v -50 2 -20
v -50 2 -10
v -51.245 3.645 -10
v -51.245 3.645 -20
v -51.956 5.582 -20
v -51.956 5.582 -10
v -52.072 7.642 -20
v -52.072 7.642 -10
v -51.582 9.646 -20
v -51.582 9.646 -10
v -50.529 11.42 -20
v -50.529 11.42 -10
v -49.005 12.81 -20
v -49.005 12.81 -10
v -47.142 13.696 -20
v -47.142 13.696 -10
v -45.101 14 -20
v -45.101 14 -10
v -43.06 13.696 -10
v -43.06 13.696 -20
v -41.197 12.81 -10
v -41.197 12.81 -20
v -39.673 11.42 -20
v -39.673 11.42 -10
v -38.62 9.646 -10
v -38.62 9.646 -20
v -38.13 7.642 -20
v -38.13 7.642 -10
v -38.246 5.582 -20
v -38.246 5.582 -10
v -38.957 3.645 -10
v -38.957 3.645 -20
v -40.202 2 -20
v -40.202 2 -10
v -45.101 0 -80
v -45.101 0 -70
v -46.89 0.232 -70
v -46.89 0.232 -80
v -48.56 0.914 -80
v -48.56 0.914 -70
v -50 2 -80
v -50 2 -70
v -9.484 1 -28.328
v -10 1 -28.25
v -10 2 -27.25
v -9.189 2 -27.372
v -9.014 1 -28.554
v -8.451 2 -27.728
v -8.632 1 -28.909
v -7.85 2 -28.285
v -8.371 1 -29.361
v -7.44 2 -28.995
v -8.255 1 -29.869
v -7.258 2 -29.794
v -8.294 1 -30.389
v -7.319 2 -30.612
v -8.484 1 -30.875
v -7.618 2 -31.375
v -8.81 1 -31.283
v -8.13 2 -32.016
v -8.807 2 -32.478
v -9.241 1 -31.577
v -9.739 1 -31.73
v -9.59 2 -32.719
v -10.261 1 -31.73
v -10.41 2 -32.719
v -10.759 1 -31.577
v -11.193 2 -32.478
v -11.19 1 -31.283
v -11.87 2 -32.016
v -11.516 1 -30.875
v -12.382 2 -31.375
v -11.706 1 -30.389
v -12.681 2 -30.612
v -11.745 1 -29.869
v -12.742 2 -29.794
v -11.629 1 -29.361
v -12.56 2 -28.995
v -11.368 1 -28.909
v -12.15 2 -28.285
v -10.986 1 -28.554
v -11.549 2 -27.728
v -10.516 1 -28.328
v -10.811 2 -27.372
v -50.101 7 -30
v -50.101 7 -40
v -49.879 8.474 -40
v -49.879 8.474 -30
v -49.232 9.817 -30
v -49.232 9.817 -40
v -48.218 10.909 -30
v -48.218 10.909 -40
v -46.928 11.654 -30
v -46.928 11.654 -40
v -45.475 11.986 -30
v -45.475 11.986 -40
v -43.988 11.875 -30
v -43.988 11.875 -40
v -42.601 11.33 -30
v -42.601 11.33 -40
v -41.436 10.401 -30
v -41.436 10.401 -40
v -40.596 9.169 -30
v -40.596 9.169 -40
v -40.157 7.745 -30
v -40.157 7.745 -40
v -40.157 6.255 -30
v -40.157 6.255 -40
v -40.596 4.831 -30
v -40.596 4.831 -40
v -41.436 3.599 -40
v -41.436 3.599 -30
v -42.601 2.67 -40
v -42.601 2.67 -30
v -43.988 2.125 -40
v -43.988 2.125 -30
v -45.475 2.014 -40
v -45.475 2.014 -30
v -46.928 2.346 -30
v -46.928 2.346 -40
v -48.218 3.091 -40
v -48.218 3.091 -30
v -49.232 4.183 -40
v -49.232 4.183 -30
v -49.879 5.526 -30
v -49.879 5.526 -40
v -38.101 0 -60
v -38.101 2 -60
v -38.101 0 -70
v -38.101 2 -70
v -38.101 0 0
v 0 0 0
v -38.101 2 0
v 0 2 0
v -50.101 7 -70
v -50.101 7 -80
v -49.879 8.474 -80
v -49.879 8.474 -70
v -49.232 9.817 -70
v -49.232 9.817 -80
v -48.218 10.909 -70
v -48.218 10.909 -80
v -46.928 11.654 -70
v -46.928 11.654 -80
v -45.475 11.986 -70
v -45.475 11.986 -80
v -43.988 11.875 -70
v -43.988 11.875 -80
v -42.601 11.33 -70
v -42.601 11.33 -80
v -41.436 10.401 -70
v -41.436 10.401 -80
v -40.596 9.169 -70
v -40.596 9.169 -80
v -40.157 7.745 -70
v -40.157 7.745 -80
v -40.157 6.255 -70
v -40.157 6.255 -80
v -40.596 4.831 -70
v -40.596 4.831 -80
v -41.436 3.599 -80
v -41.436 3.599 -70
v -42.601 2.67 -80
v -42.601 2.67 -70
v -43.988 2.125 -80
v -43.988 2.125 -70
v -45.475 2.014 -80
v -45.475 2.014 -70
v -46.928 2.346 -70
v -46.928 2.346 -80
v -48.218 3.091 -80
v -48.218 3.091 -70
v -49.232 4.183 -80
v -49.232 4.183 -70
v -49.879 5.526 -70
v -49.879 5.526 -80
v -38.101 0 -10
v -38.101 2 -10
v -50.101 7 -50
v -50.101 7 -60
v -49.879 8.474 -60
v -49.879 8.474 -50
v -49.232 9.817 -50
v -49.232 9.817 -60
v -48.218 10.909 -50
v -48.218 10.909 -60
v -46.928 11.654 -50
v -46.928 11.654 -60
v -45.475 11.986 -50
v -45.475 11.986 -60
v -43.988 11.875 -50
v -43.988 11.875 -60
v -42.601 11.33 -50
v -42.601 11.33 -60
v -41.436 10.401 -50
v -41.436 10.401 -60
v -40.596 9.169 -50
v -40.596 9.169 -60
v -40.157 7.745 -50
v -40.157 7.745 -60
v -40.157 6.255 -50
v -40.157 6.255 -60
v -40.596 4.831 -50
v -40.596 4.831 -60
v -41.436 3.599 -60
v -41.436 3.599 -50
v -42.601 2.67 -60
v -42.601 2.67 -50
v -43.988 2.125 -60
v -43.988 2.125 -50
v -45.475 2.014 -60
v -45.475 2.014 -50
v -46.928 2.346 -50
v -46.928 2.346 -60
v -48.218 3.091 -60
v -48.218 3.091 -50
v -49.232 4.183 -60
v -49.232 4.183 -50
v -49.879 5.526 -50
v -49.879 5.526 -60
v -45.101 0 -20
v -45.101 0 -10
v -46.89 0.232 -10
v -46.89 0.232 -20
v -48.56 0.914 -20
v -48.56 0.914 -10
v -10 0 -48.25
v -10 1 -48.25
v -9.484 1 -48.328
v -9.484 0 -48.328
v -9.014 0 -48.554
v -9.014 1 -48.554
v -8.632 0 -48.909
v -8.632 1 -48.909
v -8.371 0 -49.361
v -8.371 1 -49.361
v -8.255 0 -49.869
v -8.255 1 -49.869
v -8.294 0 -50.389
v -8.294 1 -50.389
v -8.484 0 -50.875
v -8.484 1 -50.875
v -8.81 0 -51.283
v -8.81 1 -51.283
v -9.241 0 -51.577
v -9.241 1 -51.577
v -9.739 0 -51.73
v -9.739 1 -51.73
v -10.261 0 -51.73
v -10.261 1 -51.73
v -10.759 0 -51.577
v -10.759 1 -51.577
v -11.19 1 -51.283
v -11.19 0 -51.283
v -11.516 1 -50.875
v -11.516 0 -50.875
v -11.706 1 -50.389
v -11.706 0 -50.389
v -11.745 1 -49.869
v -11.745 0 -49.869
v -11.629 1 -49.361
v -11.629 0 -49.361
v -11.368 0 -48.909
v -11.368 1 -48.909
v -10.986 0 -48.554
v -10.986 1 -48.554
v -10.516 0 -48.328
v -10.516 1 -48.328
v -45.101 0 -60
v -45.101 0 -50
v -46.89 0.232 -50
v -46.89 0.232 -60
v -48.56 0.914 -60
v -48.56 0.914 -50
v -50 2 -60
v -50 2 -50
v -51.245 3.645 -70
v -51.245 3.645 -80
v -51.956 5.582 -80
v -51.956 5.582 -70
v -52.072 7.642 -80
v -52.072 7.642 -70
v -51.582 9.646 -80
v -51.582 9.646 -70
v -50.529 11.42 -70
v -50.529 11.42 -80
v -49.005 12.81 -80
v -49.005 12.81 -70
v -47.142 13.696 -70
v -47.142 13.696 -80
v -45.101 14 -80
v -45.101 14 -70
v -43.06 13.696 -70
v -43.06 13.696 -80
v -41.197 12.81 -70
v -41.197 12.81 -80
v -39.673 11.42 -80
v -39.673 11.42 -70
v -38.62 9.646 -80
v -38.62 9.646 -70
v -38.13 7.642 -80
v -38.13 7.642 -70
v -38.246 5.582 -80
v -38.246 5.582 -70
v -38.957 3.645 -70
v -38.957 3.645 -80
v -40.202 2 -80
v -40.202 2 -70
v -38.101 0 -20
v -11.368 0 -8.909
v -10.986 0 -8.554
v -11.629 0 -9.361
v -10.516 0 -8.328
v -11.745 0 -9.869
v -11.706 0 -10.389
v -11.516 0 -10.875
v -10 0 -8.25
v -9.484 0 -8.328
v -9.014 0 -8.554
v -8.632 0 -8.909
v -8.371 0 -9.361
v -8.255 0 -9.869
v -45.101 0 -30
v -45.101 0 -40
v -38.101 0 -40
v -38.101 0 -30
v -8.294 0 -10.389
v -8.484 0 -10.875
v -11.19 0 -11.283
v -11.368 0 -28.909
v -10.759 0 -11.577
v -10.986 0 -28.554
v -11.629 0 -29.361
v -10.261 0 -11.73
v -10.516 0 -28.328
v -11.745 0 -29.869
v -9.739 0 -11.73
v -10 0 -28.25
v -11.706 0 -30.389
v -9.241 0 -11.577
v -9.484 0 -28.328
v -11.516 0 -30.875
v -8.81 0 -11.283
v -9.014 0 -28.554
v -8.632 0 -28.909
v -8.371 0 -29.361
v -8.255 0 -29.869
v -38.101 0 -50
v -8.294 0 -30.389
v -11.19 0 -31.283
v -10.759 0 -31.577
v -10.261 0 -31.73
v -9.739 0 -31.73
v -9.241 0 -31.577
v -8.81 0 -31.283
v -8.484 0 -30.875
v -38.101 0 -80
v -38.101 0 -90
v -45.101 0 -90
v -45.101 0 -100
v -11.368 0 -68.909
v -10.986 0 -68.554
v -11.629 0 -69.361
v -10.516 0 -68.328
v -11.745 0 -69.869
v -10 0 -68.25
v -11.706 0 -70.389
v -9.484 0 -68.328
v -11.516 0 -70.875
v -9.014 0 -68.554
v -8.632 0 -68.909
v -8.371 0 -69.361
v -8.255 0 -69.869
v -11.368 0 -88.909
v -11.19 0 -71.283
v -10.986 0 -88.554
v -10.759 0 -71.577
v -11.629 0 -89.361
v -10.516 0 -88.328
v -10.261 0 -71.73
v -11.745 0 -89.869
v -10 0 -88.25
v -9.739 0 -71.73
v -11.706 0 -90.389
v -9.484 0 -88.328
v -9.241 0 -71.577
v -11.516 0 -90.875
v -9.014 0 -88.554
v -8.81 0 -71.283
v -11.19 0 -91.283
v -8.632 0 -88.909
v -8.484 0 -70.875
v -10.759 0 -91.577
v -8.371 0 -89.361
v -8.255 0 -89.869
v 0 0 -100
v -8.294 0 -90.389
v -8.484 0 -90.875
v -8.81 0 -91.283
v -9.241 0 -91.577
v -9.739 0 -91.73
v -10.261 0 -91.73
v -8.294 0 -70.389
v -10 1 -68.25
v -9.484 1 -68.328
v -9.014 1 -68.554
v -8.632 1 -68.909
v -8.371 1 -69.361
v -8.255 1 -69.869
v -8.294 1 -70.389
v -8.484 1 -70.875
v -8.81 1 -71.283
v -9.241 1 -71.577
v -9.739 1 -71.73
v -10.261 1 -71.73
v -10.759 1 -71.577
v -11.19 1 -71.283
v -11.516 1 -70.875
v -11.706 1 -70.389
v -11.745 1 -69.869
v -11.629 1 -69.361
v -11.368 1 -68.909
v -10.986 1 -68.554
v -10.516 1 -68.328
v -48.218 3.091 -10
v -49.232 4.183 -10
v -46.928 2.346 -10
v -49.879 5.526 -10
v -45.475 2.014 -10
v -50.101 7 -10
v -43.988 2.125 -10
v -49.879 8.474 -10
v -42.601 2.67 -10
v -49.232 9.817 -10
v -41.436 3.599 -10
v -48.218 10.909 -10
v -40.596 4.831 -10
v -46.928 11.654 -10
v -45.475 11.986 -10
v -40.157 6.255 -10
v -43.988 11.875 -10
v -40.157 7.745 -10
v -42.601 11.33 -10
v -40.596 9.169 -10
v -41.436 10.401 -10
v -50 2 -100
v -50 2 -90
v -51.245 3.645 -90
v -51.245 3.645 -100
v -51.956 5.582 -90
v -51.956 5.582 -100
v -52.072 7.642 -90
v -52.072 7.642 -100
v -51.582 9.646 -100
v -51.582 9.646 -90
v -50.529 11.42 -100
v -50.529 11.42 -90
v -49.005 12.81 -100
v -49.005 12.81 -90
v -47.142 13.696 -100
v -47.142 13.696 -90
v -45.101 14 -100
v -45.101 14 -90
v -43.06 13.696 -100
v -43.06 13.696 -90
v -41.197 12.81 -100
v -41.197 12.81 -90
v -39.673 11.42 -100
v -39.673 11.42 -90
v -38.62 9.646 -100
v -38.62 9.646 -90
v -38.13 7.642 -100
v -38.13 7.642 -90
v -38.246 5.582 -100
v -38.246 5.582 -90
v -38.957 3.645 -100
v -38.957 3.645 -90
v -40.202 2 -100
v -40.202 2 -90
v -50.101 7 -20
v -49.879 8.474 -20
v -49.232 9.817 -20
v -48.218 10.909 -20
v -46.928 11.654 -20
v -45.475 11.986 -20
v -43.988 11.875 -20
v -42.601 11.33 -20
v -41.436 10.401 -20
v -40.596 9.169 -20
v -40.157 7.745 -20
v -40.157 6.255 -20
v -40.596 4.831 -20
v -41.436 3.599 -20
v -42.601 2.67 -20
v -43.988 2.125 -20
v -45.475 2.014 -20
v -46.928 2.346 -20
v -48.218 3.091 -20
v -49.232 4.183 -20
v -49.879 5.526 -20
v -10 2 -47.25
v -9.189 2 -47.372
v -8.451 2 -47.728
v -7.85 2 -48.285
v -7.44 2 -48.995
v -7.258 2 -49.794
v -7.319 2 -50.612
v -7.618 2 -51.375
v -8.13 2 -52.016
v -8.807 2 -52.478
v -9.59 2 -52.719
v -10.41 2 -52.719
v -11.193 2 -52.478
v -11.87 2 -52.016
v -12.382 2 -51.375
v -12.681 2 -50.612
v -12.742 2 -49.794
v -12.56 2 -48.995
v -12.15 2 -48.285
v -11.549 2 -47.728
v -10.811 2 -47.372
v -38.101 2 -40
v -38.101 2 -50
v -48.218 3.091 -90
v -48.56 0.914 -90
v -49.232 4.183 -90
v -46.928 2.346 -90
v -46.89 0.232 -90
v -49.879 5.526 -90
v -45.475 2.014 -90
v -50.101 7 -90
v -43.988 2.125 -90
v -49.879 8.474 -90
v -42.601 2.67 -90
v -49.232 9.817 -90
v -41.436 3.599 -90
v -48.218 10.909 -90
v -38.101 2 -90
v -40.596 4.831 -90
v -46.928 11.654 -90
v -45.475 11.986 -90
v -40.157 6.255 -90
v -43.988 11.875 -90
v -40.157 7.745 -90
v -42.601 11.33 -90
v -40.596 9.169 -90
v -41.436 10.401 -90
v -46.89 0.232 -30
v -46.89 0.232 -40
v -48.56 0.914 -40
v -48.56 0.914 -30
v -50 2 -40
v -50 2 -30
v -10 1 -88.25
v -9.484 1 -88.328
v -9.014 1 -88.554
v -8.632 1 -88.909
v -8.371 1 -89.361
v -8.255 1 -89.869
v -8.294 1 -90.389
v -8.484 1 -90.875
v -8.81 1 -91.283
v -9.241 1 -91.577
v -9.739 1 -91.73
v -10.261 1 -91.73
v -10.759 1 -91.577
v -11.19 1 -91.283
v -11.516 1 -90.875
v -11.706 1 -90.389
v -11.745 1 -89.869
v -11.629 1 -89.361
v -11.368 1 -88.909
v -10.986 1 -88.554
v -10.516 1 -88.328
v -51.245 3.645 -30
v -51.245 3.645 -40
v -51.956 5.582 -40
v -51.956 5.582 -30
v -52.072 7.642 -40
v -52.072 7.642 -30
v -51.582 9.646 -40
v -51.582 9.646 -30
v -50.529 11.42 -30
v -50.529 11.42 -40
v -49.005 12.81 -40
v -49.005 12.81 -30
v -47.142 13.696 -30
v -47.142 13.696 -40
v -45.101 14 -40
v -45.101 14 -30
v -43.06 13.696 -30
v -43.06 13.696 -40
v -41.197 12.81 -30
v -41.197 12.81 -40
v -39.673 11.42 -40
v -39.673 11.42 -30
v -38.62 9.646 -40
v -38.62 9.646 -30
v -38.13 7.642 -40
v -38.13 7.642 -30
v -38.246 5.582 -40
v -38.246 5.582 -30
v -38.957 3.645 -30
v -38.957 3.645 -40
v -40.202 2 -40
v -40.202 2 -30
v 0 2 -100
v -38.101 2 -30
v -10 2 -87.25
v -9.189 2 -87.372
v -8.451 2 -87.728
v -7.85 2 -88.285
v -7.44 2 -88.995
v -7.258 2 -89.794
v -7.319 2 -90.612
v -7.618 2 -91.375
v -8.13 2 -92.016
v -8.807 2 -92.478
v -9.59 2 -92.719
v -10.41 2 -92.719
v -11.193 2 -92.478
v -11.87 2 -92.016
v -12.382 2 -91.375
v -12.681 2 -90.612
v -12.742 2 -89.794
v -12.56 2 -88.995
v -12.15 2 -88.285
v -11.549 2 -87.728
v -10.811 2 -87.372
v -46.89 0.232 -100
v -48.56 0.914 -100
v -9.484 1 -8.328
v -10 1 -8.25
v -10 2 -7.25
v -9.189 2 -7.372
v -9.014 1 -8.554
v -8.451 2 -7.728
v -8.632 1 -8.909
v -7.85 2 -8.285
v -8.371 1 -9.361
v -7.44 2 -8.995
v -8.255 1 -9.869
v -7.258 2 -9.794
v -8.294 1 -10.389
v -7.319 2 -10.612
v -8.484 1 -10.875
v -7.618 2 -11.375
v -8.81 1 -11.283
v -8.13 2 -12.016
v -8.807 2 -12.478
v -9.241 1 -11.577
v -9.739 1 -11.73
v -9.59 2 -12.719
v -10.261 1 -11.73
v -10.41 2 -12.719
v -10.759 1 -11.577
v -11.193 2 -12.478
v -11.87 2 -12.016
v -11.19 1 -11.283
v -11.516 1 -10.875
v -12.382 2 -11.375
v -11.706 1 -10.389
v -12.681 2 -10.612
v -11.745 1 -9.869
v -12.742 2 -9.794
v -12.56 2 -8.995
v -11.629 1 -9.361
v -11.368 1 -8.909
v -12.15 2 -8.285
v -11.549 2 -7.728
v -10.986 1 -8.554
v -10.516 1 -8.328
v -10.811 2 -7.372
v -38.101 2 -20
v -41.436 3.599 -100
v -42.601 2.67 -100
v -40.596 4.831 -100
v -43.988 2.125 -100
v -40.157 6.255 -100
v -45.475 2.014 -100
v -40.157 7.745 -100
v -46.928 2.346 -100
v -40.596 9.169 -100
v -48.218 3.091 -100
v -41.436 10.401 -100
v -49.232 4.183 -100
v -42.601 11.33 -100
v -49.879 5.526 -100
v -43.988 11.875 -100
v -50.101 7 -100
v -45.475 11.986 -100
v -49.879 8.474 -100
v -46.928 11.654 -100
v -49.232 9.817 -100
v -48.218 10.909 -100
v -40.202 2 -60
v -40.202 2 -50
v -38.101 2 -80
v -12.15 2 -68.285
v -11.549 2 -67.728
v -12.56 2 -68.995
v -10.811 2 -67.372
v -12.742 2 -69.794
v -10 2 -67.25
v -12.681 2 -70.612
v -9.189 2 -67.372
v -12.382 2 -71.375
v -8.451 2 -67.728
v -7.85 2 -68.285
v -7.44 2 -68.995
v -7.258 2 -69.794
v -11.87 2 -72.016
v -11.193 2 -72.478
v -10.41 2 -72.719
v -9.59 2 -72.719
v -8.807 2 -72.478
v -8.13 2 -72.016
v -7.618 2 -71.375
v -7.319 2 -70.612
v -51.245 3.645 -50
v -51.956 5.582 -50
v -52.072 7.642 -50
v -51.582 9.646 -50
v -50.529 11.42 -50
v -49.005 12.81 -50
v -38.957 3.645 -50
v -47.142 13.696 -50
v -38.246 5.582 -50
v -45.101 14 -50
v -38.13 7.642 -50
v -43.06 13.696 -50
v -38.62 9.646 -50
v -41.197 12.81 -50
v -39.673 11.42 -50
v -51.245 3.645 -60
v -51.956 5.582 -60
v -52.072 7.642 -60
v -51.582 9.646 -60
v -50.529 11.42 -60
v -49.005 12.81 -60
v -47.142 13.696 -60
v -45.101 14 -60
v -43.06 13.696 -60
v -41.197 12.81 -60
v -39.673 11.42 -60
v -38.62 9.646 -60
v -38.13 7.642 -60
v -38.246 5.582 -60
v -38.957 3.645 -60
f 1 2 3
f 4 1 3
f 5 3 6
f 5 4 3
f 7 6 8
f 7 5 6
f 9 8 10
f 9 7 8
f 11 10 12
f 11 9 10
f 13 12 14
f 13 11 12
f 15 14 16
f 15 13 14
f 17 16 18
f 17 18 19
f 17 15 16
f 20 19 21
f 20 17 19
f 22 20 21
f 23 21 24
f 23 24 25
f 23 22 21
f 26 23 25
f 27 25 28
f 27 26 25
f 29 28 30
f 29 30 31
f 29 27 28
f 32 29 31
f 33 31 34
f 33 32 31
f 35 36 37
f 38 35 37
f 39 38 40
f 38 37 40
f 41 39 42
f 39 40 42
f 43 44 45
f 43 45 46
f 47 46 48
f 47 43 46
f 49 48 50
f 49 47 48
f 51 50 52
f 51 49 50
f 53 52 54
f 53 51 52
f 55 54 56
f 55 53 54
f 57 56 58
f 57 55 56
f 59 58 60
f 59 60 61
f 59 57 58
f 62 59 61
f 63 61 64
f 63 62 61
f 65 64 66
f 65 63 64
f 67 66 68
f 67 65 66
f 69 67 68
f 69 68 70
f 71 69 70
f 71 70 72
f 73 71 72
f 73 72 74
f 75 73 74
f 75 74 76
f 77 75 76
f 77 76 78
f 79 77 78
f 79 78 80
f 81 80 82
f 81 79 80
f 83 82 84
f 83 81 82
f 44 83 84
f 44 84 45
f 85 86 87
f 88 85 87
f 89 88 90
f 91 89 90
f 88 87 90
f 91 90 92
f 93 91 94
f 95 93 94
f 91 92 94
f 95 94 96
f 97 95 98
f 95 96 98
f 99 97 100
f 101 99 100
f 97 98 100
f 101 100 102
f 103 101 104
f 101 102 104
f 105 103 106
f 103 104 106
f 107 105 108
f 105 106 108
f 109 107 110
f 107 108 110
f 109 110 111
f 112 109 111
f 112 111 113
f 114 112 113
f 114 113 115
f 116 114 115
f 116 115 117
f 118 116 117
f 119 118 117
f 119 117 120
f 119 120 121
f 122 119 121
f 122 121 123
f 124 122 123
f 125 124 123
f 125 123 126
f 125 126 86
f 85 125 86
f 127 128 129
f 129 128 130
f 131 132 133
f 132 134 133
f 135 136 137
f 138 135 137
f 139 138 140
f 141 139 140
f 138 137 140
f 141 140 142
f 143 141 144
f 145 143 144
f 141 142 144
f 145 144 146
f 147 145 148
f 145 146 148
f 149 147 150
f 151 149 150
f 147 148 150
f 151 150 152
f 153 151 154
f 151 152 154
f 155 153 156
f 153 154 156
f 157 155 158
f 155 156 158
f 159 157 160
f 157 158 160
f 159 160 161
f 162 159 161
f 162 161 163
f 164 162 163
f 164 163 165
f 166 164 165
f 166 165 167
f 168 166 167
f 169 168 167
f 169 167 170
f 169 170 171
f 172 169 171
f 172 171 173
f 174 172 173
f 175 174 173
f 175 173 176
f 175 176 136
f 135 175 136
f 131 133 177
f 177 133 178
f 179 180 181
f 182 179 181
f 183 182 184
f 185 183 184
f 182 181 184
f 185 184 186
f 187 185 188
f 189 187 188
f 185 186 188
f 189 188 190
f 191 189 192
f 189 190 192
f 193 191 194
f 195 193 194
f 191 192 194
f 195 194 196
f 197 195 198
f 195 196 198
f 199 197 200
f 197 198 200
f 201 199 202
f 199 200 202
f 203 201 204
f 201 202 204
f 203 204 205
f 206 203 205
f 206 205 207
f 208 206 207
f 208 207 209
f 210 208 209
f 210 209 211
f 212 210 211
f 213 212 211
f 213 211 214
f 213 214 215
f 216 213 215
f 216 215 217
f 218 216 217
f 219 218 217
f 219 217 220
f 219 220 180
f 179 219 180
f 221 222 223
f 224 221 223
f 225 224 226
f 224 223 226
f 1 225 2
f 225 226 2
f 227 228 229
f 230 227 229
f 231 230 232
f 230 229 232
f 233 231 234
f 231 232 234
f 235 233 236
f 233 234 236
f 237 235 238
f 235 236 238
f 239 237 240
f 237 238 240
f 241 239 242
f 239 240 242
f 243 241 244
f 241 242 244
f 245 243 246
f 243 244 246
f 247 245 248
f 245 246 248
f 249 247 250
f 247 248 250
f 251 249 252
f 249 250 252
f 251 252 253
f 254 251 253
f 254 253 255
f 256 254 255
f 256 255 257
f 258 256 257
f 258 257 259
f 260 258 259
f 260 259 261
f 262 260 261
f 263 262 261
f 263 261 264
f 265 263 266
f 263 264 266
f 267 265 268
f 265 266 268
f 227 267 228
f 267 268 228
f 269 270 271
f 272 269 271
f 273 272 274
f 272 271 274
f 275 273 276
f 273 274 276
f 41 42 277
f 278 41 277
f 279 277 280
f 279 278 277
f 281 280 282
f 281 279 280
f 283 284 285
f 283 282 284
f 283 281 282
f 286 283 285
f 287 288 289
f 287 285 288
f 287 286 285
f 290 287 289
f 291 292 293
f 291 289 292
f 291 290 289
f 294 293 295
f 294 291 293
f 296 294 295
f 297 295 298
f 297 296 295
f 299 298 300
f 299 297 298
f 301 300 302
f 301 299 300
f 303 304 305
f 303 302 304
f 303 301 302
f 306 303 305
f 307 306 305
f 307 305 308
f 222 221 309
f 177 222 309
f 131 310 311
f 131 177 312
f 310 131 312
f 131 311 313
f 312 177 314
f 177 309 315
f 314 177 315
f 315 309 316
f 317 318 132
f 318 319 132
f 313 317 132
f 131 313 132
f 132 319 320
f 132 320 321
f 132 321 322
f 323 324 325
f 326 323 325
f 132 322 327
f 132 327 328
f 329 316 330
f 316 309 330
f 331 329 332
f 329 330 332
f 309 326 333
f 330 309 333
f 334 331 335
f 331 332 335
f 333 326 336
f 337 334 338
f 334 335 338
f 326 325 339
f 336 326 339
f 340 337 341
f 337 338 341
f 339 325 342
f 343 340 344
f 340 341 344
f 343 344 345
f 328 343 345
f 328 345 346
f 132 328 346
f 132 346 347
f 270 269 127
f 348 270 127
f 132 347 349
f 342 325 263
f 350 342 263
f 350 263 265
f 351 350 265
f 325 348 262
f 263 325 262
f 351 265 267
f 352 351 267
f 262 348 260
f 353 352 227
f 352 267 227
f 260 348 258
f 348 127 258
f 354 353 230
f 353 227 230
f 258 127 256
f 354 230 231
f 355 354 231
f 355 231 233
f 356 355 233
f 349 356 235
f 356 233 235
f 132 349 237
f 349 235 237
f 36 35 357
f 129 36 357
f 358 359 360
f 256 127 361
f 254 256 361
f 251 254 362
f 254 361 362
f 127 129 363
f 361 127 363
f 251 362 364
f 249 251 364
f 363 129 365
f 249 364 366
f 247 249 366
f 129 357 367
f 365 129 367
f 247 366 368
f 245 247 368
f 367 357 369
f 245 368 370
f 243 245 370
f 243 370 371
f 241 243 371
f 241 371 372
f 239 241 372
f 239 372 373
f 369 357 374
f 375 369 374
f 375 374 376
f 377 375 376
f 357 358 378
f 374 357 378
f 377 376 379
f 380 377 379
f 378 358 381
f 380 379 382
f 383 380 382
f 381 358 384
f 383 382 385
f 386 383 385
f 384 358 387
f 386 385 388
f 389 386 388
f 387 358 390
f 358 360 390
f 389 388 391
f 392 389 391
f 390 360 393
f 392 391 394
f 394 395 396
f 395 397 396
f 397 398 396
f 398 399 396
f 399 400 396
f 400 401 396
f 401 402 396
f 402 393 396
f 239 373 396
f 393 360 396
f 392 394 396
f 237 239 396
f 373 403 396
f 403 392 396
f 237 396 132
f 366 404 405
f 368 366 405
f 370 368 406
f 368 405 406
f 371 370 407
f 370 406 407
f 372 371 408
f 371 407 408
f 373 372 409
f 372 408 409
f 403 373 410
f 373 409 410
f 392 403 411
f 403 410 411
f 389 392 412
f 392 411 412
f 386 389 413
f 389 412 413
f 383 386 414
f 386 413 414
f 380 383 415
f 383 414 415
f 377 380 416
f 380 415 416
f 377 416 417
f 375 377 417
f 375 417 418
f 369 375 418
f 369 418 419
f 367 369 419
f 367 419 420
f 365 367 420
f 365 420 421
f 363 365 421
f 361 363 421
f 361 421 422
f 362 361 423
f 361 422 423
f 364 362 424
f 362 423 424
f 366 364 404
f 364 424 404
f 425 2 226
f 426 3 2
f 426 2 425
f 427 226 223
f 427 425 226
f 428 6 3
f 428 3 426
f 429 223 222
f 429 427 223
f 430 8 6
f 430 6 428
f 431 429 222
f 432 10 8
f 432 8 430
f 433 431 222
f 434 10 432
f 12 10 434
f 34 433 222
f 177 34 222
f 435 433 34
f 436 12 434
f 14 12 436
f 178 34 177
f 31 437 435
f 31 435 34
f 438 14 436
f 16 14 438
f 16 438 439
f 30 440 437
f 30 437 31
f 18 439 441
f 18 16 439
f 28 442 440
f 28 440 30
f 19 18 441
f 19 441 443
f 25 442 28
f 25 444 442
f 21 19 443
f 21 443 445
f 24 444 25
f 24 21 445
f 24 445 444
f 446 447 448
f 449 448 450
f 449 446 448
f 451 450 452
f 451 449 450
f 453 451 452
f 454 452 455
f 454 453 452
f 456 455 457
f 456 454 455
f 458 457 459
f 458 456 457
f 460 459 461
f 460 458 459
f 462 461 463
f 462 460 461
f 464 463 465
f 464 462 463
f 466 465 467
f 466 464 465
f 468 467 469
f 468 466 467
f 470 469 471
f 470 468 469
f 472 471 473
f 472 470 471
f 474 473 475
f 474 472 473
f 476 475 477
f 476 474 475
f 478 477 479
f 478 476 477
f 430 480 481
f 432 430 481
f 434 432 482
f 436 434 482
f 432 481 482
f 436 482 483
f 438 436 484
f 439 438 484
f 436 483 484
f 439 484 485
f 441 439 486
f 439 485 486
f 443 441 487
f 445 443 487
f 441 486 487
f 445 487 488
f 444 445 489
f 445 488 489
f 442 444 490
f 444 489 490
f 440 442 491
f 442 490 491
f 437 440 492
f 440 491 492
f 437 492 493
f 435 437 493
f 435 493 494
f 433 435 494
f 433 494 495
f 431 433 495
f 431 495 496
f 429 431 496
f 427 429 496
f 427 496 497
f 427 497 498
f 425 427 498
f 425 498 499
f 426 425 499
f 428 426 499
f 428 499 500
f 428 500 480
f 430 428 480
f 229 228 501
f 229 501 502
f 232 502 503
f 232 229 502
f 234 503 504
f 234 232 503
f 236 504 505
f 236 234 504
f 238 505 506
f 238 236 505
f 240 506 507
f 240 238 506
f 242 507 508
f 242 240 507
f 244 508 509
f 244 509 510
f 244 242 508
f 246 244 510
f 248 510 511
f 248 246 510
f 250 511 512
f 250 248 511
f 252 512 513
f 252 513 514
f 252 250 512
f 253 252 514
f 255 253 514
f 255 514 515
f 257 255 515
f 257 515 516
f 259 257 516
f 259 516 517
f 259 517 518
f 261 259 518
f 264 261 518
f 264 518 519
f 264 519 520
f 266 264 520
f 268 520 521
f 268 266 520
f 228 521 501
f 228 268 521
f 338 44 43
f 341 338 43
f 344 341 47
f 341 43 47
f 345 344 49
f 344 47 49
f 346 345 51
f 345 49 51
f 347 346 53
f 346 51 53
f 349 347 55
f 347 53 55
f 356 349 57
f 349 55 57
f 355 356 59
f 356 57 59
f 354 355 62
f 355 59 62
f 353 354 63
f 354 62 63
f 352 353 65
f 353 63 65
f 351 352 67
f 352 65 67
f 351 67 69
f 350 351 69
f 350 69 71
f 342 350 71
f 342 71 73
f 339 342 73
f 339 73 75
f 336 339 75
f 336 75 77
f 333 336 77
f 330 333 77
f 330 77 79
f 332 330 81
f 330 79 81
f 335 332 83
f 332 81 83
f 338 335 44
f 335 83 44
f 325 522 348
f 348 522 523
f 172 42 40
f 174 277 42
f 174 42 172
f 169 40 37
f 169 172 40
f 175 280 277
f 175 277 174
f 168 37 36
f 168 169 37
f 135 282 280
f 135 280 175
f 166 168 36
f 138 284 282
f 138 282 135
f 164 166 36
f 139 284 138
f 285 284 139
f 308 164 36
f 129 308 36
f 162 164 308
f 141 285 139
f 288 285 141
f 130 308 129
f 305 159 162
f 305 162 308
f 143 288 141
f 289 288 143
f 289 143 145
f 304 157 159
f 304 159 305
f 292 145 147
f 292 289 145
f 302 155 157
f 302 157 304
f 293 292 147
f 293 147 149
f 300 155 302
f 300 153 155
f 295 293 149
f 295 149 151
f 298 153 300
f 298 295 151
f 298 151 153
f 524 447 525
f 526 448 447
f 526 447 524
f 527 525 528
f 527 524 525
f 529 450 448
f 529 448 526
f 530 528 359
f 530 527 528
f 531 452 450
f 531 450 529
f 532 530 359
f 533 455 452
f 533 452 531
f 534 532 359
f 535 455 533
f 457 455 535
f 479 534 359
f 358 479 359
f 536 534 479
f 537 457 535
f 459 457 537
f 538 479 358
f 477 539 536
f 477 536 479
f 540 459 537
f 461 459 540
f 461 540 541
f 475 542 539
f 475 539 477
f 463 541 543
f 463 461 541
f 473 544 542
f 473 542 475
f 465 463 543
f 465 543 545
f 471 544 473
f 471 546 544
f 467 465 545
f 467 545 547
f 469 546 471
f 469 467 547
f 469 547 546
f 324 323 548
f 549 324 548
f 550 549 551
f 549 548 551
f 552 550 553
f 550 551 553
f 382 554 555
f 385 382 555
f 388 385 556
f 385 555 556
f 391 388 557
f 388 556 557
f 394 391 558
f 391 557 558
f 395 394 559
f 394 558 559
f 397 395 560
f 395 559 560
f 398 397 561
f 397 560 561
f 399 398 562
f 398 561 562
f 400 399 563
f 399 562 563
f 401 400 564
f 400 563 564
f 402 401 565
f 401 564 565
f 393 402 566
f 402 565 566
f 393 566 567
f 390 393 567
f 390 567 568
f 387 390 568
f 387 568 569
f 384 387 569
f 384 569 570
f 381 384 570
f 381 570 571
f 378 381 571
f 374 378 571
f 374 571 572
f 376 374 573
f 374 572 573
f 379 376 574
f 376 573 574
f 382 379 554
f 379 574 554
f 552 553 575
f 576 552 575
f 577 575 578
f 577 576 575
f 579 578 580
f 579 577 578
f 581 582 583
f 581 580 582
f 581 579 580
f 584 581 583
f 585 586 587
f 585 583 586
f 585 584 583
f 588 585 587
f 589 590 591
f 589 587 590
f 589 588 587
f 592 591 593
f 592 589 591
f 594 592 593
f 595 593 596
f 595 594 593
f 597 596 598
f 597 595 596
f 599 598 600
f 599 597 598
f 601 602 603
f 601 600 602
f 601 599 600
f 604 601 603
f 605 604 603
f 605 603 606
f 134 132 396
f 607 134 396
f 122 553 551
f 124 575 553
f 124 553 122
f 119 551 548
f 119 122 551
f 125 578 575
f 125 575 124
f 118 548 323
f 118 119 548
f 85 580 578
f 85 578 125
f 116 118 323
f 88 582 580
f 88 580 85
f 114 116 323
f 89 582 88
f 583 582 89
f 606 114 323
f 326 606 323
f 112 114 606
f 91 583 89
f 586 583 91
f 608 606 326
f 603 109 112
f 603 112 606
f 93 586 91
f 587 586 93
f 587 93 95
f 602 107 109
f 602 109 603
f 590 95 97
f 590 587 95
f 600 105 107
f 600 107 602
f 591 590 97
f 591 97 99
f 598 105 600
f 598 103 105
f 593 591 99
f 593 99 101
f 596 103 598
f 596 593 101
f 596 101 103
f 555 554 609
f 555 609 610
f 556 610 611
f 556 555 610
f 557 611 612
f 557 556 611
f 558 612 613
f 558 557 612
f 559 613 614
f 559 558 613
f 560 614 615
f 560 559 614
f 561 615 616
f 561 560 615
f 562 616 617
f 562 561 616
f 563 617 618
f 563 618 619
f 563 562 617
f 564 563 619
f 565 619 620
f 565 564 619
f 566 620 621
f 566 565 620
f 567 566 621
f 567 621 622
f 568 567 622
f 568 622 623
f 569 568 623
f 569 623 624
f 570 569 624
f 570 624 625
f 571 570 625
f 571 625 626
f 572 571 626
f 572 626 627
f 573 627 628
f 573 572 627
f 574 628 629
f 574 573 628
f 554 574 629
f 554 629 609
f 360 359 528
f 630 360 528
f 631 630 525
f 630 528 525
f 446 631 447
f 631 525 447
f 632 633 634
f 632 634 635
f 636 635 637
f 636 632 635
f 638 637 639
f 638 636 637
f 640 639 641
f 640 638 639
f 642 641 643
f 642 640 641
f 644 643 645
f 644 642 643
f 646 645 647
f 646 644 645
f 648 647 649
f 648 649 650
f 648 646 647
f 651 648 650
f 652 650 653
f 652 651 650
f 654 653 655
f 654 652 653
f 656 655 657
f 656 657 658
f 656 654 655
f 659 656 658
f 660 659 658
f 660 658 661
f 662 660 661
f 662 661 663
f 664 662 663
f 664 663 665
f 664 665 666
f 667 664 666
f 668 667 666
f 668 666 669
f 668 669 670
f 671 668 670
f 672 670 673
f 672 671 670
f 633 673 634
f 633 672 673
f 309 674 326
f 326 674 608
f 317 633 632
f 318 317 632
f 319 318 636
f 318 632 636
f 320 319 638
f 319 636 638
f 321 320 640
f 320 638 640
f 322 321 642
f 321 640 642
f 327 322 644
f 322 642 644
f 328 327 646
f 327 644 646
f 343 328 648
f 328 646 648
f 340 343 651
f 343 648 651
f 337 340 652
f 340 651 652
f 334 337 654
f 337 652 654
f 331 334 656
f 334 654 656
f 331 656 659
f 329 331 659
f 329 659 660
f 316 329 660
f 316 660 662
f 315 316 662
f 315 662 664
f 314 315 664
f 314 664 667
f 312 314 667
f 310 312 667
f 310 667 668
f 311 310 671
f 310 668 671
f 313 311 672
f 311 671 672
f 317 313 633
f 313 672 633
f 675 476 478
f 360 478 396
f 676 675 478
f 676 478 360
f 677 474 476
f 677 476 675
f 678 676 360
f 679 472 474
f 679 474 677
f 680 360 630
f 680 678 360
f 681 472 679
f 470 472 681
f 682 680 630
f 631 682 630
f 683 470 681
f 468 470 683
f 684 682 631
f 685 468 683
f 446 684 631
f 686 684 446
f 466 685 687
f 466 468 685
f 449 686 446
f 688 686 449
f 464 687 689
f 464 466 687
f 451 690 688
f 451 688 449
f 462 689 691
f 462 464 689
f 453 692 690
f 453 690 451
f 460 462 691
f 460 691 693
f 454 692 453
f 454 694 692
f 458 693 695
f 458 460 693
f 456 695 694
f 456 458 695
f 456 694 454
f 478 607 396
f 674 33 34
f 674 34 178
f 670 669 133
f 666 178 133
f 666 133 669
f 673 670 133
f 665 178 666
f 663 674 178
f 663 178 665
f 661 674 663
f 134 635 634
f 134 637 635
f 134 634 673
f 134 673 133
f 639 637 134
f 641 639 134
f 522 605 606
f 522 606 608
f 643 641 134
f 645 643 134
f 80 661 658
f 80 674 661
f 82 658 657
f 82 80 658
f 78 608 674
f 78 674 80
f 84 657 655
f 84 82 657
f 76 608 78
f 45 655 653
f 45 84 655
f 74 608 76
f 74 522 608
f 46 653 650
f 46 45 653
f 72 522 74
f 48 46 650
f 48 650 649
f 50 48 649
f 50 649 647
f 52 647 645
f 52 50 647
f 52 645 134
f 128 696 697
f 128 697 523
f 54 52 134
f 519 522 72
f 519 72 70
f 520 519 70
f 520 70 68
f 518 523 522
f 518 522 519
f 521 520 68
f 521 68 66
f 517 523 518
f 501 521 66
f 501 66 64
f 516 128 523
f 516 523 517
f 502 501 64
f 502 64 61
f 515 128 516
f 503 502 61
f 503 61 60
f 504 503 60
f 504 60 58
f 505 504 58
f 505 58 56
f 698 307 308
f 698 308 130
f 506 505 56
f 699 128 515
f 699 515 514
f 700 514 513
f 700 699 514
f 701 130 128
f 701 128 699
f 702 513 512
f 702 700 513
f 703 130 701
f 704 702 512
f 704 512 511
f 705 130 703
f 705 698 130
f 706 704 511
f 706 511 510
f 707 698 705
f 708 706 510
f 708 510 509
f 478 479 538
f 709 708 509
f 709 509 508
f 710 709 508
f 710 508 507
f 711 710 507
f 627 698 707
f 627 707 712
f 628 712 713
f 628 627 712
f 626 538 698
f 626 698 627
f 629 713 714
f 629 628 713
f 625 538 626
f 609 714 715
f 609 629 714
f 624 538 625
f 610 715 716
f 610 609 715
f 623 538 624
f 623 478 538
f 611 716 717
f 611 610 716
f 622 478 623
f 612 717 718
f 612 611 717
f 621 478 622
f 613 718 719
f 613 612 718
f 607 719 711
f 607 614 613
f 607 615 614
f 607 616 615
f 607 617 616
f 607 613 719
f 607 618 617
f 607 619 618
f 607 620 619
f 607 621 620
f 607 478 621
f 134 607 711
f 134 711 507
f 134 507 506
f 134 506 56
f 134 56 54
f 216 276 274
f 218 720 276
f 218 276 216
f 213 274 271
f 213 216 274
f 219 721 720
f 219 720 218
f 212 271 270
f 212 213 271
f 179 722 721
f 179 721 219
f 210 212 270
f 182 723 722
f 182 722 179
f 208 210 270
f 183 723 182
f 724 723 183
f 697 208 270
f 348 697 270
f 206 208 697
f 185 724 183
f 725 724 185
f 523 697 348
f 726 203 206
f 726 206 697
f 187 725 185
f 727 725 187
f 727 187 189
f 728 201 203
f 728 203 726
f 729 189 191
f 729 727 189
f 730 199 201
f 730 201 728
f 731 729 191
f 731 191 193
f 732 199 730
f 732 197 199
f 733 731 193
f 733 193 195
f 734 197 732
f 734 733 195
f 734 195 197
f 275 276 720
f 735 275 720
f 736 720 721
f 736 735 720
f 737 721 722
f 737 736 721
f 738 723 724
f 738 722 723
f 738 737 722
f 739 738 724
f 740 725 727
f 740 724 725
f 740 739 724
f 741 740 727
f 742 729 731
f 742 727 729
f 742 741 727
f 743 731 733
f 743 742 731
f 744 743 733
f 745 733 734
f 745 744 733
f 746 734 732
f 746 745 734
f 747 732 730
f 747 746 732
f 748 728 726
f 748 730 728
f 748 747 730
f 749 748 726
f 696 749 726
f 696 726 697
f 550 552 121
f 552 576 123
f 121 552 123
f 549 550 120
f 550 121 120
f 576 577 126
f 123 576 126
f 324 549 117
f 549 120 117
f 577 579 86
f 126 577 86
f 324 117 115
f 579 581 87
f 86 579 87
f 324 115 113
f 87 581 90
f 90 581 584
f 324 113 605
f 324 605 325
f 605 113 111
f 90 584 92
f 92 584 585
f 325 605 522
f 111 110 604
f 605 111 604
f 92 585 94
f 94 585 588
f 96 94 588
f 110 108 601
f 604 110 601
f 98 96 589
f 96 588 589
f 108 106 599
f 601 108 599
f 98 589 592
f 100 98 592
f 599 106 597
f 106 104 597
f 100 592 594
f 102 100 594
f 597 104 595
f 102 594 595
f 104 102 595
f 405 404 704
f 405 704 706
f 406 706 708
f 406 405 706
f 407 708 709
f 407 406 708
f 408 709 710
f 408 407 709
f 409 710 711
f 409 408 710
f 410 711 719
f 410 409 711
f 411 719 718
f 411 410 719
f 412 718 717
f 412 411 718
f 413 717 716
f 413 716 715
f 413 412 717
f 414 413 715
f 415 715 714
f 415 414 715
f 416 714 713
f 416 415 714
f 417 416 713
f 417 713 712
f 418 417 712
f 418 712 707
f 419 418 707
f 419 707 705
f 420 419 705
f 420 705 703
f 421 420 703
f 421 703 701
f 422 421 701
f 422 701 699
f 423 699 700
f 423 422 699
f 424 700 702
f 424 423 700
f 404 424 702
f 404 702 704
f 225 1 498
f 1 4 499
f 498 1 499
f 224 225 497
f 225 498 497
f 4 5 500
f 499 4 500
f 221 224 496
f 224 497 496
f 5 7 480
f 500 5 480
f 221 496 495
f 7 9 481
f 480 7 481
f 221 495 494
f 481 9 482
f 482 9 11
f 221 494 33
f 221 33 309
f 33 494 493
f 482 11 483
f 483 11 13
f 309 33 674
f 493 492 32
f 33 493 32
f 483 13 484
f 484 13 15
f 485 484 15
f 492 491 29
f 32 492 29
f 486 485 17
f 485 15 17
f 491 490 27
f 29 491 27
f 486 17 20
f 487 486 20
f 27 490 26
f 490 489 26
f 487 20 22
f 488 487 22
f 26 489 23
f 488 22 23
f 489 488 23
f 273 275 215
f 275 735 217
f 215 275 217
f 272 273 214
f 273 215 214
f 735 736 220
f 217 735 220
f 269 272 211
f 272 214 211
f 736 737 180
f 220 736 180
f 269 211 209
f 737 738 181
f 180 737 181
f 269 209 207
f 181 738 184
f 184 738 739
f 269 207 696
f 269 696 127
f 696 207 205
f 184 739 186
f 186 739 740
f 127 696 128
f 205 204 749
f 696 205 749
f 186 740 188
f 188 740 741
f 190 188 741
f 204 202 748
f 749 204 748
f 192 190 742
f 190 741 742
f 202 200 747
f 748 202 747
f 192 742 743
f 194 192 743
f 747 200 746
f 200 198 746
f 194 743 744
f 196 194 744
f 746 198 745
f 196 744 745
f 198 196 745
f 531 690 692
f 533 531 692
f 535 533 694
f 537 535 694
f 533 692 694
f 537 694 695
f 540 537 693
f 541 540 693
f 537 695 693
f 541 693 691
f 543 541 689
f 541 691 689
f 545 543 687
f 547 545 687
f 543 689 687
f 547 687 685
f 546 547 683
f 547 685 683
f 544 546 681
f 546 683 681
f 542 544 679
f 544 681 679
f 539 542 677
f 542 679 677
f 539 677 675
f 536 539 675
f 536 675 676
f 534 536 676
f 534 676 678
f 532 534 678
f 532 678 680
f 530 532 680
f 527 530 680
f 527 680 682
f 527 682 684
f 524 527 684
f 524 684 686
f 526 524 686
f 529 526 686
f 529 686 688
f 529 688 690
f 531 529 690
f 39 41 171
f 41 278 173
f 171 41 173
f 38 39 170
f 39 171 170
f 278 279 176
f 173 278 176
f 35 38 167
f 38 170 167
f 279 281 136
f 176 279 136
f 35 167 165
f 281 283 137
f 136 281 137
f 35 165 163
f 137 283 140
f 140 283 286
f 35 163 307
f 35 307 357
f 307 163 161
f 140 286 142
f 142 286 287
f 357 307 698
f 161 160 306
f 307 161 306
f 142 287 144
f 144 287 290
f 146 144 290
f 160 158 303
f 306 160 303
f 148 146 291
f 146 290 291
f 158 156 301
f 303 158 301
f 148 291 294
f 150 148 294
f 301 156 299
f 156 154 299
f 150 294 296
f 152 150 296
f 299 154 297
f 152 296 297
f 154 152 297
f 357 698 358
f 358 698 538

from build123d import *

# Parameters (mm, degrees)
SKETCH1_W           = 50
SKETCH1_H           = 100
BOSS_EXTRUDE1_DEPTH = 2
SKETCH2_R           = 7
BOSS_EXTRUDE2_DEPTH = 100
SKETCH3_R           = 5
CUT_EXTRUDE1_DEPTH  = 114.624453084
FILLET3_R           = 7
SKETCH6_W           = 50
SKETCH6_H           = 10
CUT_EXTRUDE3_DEPTH  = 114.395398225
LPATTERN1_COUNT     = 5
LPATTERN1_PITCH     = 20
SKETCH7_R           = 1.75
CUT_EXTRUDE4_DEPTH  = 114.395398225
CHAMFER2_SIZE       = 1
LPATTERN3_COUNT     = 5
LPATTERN3_PITCH     = 20
CHAMFER3_SIZE       = 1


with BuildPart() as part:
    # Sketch1 → Boss-Extrude1 (new body)
    with BuildSketch(Plane(origin=(0, 0, 0), x_dir=(1, 0, 0), z_dir=(0, 1, 0))):
        with Locations((-25, 50)):
            Rectangle(SKETCH1_W, SKETCH1_H)
    extrude(amount=BOSS_EXTRUDE1_DEPTH)

    # Sketch2 → Boss-Extrude2 (add)
    with BuildSketch(Plane(origin=(0, 0, -100), x_dir=(-1, 0, 0), z_dir=(0, 0, -1))):
        with Locations((45.101020514, 7)):
            Circle(SKETCH2_R)
    extrude(amount=-BOSS_EXTRUDE2_DEPTH)

    # Sketch3 → Cut-Extrude1 (cut, through all)
    with BuildSketch(Plane(origin=(0, 0, -100), x_dir=(-1, 0, 0), z_dir=(0, 0, -1))):
        with Locations((45.101020514, 7)):
            Circle(SKETCH3_R)
    extrude(amount=-CUT_EXTRUDE1_DEPTH, mode=Mode.SUBTRACT)

    # Fillet3
    # the kernel refuses this fillet: 7 mm, written as the material it takes off along each edge
    with BuildSketch(Plane(origin=(-50, 0, 12.247448714), x_dir=(1, 0, 0), z_dir=(0, 0, -1))) as fillet3_piece_1:
        with BuildLine():
            CenterArc((4.898979486, -7), FILLET3_R, 90, 44.415308597)
            Line((0, -2), (-0.09797959, -1.9))
            ThreePointArc((-0.09797959, -1.9), (-0.14, -1), (-0.14, 0))
            Line((-0.14, 0), (0, 0.14))
            Line((0, 0.14), (4.898979486, 0.14))
            Line((4.898979486, 0.14), (4.898979486, 0))
        make_face()
    extrude(amount=124.494897428, mode=Mode.SUBTRACT)

    # Sketch6 → Cut-Extrude3 (cut, symmetric)
    with BuildSketch(Plane(origin=(0, 2, 0), x_dir=(1, 0, 0), z_dir=(0, 1, 0))):
        with Locations((-63.101020514, 85)):
            Rectangle(SKETCH6_W, SKETCH6_H)
    cut_extrude3 = extrude(amount=CUT_EXTRUDE3_DEPTH, both=True, mode=Mode.SUBTRACT)

    # LPattern1: Cut-Extrude3 ×5
    with Locations(*[(0, 0, i * LPATTERN1_PITCH) for i in range(1, LPATTERN1_COUNT)]):
        add(cut_extrude3, mode=Mode.SUBTRACT)

    # Sketch7 → Cut-Extrude4 (cut, symmetric)
    with BuildSketch(Plane(origin=(0, 2, 0), x_dir=(1, 0, 0), z_dir=(0, 1, 0))):
        with Locations(Location((-10, 90, 0), (0, 0, 270))):
            Circle(SKETCH7_R)
    cut_extrude4 = extrude(amount=CUT_EXTRUDE4_DEPTH, both=True, mode=Mode.SUBTRACT)

    # Chamfer2
    chamfer2_edges = [part.edges().sort_by_distance(p)[0] for p in [
        (-10, 2, -91.75),
    ]]
    chamfer(chamfer2_edges, length=CHAMFER2_SIZE)

    # LPattern3: Cut-Extrude4 ×5
    with Locations(*[(0, 0, i * LPATTERN3_PITCH) for i in range(1, LPATTERN3_COUNT)]):
        add(cut_extrude4, mode=Mode.SUBTRACT)

    # Chamfer3
    chamfer3_edges = [part.edges().sort_by_distance(p)[0] for p in [
        (-10, 2, -71.75),
        (-10, 2, -51.75),
        (-10, 2, -31.75),
        (-10, 2, -11.75),
    ]]
    chamfer(chamfer3_edges, length=CHAMFER3_SIZE)


solid = part.part
